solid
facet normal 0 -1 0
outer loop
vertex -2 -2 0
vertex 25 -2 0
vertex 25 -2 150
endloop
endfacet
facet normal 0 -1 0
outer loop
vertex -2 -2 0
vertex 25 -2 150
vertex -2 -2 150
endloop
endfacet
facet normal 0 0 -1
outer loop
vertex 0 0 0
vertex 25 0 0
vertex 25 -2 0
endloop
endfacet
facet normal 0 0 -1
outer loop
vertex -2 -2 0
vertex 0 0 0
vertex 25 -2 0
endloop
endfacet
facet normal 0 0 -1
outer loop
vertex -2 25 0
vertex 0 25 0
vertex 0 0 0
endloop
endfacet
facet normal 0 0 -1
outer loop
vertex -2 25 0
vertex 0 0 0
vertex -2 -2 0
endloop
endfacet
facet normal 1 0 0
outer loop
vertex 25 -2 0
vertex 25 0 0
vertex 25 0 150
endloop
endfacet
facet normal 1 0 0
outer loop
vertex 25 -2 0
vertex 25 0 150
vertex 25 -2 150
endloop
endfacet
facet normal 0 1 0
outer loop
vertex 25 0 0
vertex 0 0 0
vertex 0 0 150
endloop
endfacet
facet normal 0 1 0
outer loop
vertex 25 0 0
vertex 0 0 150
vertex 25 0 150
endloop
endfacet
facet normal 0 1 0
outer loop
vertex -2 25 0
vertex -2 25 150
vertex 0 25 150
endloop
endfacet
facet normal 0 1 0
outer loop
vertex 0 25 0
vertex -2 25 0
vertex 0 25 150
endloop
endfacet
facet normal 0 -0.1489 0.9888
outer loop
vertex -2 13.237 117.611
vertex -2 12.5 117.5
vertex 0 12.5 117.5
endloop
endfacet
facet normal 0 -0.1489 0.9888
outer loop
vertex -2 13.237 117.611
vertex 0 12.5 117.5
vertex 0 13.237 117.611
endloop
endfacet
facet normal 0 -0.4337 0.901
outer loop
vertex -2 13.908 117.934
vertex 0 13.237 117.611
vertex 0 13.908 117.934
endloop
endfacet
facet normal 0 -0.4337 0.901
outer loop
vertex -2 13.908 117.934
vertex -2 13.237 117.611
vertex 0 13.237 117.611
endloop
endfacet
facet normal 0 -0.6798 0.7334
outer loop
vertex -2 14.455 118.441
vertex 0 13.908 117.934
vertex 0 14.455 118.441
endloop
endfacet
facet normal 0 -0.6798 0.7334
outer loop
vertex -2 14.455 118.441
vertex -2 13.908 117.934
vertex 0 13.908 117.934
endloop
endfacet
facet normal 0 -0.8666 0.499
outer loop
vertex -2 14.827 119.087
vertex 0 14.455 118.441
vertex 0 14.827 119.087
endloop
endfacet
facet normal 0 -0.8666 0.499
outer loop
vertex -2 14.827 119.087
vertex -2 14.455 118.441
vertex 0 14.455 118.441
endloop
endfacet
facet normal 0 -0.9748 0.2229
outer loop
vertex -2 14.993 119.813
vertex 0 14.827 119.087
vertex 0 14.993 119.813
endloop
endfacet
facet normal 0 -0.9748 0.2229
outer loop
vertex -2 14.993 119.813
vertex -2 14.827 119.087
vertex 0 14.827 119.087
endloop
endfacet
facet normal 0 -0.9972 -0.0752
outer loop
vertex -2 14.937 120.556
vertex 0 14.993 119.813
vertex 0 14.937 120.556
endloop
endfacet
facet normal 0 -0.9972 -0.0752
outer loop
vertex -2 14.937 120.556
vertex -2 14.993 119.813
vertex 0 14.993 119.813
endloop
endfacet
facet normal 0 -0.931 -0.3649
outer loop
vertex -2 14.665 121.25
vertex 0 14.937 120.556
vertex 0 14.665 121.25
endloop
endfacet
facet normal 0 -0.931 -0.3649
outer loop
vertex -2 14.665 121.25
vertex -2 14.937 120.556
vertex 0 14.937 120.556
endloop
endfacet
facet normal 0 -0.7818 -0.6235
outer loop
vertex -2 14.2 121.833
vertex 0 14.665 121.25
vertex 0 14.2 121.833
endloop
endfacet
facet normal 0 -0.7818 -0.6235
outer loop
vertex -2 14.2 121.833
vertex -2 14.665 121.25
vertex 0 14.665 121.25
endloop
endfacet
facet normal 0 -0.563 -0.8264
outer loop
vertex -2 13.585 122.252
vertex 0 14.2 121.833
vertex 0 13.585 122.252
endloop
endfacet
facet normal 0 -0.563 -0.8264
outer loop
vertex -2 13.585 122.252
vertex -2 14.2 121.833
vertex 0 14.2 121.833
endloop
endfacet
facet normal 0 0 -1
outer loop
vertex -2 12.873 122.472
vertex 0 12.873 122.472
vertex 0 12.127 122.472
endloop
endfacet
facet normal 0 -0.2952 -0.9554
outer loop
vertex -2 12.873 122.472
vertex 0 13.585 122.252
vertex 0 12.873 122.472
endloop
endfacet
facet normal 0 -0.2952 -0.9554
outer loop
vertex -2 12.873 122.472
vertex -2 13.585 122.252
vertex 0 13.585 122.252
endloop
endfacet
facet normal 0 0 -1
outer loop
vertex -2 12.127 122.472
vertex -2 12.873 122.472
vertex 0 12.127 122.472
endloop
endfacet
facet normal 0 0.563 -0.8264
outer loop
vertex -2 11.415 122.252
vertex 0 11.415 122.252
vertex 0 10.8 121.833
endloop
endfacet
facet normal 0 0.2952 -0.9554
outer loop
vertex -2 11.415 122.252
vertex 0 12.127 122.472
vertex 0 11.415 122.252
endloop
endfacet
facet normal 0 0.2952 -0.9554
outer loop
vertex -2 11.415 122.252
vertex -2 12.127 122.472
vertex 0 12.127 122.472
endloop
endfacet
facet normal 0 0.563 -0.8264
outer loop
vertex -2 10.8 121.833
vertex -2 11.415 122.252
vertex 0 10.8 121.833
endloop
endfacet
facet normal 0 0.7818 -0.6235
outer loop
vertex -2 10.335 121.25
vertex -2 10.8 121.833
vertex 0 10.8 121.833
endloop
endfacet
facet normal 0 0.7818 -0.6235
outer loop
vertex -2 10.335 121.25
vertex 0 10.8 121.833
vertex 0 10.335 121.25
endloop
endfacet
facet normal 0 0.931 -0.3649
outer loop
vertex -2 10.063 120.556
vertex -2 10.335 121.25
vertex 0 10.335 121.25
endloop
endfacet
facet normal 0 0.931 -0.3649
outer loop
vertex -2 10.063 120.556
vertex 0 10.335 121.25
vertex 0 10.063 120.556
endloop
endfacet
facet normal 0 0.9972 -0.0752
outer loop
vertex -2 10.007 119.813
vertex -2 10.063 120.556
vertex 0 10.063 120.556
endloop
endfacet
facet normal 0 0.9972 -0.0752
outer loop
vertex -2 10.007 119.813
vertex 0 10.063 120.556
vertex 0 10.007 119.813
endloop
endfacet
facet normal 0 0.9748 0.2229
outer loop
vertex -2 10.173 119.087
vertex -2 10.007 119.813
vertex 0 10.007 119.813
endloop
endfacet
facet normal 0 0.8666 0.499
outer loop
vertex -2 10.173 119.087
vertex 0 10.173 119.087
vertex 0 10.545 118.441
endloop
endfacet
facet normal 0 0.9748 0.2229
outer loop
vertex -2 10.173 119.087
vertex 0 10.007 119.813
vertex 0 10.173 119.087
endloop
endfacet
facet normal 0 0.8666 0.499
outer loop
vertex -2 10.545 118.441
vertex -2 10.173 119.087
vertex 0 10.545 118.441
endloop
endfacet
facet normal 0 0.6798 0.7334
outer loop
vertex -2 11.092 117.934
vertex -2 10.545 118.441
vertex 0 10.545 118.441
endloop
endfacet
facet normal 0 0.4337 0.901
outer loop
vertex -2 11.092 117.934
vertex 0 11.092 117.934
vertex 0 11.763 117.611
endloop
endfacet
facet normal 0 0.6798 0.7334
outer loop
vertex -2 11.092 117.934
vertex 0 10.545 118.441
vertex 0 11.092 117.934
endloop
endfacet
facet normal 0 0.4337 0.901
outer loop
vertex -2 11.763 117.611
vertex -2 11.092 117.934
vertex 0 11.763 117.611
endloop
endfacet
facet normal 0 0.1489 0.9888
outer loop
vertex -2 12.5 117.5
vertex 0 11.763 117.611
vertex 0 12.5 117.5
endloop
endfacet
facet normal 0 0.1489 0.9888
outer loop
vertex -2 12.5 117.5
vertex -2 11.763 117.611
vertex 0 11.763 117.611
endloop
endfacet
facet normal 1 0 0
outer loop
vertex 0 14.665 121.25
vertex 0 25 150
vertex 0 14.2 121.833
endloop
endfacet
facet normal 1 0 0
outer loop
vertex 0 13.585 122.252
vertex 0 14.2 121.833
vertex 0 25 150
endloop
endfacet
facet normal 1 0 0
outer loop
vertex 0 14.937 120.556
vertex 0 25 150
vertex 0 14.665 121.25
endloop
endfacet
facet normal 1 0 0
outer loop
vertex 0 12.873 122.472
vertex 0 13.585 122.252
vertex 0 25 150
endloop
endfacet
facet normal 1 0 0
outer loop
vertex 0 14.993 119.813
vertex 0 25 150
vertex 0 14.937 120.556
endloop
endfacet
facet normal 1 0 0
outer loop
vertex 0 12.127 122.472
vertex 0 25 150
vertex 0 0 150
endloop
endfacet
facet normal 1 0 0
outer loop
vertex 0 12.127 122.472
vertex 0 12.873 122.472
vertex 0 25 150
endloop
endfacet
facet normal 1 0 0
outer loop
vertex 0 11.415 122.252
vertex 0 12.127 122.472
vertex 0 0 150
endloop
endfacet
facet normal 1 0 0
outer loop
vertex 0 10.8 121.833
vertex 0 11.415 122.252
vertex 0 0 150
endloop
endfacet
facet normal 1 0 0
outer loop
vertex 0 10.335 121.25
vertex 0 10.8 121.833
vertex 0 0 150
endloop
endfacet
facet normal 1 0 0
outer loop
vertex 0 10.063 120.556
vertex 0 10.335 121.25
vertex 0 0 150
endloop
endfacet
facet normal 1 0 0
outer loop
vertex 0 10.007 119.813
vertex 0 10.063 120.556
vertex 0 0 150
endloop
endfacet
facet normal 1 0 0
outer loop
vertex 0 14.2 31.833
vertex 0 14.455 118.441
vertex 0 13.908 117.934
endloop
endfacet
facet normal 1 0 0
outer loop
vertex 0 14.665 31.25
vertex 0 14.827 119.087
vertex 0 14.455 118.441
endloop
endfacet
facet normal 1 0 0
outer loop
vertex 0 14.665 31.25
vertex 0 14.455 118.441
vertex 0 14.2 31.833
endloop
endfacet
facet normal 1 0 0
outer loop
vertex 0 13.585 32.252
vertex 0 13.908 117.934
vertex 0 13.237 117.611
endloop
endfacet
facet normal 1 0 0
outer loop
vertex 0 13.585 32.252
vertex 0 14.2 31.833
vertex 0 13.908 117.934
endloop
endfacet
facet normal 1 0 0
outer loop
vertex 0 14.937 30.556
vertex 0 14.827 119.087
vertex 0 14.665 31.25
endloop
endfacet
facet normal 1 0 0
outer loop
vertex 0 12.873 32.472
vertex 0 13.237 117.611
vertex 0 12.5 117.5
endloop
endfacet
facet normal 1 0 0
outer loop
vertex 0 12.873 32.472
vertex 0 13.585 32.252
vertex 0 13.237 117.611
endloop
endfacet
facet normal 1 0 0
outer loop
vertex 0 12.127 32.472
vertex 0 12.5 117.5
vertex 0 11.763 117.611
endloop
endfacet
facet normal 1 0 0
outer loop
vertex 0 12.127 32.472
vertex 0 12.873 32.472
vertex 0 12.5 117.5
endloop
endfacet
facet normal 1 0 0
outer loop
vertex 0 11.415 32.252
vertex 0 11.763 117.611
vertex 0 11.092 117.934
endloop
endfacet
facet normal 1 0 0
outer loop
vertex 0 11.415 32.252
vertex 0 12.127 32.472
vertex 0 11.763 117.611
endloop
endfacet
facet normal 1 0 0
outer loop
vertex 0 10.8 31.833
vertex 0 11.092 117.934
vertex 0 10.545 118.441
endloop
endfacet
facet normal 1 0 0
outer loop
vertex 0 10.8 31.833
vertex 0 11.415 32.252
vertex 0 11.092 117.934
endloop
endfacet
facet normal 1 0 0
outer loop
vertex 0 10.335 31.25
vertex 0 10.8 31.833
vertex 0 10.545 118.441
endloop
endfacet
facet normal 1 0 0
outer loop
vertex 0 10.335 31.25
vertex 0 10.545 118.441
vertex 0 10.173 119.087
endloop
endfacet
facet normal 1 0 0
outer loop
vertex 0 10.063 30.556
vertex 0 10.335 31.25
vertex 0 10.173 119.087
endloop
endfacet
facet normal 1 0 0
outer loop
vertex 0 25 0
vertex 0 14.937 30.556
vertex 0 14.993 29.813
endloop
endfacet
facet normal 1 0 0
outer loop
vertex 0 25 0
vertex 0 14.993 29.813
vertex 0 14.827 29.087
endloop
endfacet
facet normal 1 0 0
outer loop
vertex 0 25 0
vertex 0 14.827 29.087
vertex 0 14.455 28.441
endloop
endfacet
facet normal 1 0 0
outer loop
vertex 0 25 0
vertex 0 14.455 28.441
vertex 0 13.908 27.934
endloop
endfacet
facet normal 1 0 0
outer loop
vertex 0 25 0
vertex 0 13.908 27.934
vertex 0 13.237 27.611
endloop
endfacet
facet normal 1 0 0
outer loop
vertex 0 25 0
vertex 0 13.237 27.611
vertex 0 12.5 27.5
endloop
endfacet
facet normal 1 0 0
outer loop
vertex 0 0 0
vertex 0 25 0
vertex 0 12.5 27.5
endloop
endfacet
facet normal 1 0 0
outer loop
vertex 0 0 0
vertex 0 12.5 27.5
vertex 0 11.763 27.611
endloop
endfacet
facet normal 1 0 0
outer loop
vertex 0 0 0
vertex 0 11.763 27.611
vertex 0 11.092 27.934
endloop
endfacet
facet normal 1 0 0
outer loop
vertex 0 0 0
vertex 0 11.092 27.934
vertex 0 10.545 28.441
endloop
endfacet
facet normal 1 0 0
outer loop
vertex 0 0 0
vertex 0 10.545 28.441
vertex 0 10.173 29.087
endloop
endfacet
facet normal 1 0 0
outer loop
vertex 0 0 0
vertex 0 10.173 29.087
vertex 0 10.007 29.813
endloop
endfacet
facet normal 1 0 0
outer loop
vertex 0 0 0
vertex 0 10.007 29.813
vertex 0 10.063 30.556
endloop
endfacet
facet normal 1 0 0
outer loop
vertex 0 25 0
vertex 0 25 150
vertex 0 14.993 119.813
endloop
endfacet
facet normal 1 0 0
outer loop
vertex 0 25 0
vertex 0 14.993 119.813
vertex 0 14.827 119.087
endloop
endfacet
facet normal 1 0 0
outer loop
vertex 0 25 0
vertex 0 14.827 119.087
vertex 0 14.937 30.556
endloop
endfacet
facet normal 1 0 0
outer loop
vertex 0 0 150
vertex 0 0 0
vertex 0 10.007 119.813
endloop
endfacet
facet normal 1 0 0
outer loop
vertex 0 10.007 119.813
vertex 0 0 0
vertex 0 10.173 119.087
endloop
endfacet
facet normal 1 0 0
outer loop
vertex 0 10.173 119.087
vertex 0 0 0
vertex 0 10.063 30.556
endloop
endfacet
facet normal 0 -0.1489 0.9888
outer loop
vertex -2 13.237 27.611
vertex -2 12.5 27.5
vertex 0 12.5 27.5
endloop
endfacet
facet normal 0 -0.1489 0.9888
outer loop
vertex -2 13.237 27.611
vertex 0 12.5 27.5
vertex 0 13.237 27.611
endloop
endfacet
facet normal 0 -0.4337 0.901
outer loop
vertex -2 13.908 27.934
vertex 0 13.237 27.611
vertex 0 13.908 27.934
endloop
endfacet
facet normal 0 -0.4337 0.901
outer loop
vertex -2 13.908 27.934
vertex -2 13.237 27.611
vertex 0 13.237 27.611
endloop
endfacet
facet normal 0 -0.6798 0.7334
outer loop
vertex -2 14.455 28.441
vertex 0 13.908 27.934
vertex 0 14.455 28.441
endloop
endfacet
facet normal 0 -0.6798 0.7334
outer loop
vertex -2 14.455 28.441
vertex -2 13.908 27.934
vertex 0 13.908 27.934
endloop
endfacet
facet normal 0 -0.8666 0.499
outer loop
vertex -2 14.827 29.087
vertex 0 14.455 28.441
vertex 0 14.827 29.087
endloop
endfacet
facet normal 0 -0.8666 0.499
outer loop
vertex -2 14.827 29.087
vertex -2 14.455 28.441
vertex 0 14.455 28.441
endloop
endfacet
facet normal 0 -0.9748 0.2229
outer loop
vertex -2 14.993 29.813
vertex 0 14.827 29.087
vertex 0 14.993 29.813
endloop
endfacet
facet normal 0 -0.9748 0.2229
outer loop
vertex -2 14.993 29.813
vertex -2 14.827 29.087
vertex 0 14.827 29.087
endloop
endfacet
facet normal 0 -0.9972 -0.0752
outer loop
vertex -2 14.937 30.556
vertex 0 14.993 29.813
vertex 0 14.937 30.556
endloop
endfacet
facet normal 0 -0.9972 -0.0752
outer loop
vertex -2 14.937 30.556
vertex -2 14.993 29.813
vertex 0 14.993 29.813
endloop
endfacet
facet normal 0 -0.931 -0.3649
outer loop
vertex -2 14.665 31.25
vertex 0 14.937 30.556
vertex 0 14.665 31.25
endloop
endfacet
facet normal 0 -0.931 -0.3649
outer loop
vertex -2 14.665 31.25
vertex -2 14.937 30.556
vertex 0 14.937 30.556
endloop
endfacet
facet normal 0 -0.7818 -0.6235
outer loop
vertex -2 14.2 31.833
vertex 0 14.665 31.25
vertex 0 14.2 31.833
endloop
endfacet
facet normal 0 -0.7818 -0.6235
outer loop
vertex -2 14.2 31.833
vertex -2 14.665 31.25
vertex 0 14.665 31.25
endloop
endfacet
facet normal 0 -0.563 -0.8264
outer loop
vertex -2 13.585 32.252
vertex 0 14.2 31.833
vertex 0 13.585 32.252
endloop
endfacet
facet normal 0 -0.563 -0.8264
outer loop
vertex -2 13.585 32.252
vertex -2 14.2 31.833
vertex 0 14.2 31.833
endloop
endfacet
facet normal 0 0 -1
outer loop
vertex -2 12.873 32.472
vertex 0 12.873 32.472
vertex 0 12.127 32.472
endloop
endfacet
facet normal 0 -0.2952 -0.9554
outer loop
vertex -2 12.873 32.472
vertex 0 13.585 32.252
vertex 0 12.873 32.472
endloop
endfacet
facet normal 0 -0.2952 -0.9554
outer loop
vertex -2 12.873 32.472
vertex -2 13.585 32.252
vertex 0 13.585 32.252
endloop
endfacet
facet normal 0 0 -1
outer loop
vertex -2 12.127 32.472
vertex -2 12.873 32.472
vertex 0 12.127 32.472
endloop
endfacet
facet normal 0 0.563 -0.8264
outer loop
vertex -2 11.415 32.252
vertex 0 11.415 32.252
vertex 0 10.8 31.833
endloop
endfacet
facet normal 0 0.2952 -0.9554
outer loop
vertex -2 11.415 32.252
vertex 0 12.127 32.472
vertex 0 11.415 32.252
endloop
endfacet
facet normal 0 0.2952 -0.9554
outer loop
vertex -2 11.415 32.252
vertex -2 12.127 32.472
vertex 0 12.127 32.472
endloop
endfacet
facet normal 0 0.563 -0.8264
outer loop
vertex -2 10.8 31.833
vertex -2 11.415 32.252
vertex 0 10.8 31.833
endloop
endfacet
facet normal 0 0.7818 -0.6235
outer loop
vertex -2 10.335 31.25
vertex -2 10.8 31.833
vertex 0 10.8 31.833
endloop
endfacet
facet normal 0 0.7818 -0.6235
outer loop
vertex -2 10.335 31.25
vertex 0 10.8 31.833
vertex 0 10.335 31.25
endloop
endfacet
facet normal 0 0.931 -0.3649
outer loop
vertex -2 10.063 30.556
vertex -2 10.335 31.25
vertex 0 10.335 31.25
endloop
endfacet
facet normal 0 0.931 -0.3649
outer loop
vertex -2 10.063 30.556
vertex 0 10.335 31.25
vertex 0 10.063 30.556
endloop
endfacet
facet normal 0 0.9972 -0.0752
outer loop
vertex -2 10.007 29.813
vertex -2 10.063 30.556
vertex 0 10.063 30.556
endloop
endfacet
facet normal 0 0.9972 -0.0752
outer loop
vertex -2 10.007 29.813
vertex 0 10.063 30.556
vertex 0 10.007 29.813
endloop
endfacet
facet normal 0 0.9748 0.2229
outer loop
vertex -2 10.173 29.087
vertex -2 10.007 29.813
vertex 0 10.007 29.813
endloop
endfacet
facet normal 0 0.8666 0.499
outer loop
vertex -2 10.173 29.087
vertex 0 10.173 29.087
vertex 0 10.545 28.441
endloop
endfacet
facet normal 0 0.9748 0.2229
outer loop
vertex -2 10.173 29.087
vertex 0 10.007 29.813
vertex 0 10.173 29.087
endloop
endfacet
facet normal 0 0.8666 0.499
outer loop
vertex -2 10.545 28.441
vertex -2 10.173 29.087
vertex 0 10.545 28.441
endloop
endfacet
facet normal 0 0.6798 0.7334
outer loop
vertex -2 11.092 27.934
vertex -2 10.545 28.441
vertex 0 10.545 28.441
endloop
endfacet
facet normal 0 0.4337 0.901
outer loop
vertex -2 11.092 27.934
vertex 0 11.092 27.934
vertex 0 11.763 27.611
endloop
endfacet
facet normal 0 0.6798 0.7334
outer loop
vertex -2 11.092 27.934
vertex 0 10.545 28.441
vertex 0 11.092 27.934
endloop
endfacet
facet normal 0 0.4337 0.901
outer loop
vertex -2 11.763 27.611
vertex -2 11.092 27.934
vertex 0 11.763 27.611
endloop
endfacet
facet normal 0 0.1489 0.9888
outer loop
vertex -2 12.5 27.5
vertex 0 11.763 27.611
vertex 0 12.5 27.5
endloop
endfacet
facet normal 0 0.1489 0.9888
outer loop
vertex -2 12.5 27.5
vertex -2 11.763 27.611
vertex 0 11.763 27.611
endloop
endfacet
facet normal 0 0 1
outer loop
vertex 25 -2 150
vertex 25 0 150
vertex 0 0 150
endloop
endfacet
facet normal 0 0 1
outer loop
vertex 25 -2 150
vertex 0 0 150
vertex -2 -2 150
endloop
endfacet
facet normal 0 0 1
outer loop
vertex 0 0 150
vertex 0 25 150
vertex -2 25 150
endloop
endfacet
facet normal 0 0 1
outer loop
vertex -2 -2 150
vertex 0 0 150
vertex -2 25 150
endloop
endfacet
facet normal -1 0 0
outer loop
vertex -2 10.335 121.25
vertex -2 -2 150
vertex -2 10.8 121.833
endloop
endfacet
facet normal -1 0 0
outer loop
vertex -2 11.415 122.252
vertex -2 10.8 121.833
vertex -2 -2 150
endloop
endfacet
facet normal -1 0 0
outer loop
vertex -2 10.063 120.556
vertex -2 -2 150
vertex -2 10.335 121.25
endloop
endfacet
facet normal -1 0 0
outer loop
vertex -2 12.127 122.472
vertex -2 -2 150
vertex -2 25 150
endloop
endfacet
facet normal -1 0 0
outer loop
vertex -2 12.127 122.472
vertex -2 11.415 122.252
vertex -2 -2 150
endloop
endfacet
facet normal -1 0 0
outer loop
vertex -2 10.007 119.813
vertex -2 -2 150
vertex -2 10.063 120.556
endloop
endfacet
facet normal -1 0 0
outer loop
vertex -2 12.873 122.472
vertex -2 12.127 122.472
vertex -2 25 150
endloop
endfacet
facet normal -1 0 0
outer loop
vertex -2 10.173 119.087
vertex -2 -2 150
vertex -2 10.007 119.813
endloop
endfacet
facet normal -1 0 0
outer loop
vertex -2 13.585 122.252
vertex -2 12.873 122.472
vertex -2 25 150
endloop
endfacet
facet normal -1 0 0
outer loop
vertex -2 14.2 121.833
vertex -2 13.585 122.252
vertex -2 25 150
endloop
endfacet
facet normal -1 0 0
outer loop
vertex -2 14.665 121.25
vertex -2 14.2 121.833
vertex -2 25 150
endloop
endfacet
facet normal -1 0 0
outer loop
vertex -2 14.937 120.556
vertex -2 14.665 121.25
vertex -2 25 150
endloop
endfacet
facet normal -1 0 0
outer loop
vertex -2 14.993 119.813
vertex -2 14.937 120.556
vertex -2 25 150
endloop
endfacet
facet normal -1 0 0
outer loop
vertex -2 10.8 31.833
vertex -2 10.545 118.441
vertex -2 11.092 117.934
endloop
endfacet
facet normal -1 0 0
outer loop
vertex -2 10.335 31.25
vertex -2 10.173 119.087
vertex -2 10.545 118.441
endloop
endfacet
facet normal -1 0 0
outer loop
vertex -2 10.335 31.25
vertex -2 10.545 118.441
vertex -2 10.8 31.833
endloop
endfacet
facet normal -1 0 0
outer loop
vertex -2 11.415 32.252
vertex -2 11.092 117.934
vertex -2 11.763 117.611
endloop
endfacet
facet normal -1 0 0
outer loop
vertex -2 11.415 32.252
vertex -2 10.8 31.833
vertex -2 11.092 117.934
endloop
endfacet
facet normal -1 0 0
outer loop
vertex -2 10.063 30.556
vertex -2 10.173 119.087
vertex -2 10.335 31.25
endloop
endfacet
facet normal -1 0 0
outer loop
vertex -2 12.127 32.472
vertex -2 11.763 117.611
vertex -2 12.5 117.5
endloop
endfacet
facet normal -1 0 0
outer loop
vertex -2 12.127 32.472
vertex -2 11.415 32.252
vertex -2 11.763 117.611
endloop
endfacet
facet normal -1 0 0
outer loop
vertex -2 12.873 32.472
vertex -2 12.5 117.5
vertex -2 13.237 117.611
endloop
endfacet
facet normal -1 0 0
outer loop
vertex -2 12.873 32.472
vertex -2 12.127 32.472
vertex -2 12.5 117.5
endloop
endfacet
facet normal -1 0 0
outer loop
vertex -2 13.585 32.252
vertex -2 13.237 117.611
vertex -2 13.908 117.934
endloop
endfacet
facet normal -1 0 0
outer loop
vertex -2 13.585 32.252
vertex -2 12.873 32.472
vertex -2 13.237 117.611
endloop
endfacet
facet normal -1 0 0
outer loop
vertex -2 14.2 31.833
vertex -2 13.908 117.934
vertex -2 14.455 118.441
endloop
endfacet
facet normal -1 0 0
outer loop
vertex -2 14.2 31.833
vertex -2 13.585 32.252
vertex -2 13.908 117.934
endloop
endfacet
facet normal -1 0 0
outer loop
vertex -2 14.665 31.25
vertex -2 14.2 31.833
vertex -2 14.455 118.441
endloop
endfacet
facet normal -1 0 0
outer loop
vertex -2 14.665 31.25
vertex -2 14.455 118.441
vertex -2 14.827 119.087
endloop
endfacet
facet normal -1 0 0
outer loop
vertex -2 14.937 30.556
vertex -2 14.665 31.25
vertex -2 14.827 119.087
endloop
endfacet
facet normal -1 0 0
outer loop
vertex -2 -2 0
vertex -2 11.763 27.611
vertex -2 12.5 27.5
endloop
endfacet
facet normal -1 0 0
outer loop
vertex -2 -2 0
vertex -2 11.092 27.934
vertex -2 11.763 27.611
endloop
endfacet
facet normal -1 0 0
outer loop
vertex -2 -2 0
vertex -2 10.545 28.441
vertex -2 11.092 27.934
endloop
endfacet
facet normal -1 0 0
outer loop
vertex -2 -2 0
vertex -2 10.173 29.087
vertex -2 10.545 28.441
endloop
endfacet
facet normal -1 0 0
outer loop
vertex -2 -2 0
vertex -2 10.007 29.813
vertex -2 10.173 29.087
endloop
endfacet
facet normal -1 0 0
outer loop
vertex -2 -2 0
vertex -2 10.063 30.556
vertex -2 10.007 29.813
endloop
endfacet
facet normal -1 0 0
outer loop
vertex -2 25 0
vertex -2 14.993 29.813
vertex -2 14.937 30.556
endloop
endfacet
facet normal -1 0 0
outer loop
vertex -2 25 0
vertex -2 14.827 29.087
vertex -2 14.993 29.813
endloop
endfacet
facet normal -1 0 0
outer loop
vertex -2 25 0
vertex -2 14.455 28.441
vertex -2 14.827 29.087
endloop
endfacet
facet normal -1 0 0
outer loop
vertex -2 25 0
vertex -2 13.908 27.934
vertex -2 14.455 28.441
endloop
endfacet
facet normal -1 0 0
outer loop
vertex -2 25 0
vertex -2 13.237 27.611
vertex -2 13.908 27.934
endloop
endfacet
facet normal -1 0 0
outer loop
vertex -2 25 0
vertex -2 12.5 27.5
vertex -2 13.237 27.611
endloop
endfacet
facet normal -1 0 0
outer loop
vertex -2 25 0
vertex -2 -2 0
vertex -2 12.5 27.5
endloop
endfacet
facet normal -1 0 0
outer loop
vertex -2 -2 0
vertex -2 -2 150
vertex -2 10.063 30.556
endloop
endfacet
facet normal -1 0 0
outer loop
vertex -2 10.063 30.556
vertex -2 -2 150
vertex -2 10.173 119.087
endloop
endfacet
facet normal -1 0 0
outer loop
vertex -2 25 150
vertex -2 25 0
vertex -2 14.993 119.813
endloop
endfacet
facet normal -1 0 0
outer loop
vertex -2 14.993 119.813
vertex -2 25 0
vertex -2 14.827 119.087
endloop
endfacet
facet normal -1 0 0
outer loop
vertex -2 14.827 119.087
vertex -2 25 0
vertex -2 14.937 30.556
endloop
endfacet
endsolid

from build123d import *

# Parameters (mm, degrees)
BOSS_EXTRUDE1_DEPTH     = 150
CUT_EXTRUDE1_DEPTH      = 155.110350074
CUT_EXTRUDE1_DEPTH_BACK = 155.110350074
SKETCH2_R               = 2.5


with BuildPart() as part:
    # Sketch1 → Boss-Extrude1 (new body)
    with BuildSketch(Plane.XY):
        Polygon((0, 0), (25, 0), (25, -2), (-2, -2), (-2, 25), (0, 25), align=None)
    extrude(amount=BOSS_EXTRUDE1_DEPTH)

    # Sketch2 → Cut-Extrude1 (cut, two sides: drawn at the far end of the back side and taken through both)
    with BuildSketch(Plane(origin=(0, 0, 0), x_dir=(0, 0, -1), z_dir=(1, 0, 0)).offset(-CUT_EXTRUDE1_DEPTH_BACK)):
        with Locations((-120, 12.5)):
            Circle(SKETCH2_R)
        with Locations((-30, 12.5)):
            Circle(SKETCH2_R)
    extrude(amount=CUT_EXTRUDE1_DEPTH + CUT_EXTRUDE1_DEPTH_BACK, mode=Mode.SUBTRACT)


solid = part.part
